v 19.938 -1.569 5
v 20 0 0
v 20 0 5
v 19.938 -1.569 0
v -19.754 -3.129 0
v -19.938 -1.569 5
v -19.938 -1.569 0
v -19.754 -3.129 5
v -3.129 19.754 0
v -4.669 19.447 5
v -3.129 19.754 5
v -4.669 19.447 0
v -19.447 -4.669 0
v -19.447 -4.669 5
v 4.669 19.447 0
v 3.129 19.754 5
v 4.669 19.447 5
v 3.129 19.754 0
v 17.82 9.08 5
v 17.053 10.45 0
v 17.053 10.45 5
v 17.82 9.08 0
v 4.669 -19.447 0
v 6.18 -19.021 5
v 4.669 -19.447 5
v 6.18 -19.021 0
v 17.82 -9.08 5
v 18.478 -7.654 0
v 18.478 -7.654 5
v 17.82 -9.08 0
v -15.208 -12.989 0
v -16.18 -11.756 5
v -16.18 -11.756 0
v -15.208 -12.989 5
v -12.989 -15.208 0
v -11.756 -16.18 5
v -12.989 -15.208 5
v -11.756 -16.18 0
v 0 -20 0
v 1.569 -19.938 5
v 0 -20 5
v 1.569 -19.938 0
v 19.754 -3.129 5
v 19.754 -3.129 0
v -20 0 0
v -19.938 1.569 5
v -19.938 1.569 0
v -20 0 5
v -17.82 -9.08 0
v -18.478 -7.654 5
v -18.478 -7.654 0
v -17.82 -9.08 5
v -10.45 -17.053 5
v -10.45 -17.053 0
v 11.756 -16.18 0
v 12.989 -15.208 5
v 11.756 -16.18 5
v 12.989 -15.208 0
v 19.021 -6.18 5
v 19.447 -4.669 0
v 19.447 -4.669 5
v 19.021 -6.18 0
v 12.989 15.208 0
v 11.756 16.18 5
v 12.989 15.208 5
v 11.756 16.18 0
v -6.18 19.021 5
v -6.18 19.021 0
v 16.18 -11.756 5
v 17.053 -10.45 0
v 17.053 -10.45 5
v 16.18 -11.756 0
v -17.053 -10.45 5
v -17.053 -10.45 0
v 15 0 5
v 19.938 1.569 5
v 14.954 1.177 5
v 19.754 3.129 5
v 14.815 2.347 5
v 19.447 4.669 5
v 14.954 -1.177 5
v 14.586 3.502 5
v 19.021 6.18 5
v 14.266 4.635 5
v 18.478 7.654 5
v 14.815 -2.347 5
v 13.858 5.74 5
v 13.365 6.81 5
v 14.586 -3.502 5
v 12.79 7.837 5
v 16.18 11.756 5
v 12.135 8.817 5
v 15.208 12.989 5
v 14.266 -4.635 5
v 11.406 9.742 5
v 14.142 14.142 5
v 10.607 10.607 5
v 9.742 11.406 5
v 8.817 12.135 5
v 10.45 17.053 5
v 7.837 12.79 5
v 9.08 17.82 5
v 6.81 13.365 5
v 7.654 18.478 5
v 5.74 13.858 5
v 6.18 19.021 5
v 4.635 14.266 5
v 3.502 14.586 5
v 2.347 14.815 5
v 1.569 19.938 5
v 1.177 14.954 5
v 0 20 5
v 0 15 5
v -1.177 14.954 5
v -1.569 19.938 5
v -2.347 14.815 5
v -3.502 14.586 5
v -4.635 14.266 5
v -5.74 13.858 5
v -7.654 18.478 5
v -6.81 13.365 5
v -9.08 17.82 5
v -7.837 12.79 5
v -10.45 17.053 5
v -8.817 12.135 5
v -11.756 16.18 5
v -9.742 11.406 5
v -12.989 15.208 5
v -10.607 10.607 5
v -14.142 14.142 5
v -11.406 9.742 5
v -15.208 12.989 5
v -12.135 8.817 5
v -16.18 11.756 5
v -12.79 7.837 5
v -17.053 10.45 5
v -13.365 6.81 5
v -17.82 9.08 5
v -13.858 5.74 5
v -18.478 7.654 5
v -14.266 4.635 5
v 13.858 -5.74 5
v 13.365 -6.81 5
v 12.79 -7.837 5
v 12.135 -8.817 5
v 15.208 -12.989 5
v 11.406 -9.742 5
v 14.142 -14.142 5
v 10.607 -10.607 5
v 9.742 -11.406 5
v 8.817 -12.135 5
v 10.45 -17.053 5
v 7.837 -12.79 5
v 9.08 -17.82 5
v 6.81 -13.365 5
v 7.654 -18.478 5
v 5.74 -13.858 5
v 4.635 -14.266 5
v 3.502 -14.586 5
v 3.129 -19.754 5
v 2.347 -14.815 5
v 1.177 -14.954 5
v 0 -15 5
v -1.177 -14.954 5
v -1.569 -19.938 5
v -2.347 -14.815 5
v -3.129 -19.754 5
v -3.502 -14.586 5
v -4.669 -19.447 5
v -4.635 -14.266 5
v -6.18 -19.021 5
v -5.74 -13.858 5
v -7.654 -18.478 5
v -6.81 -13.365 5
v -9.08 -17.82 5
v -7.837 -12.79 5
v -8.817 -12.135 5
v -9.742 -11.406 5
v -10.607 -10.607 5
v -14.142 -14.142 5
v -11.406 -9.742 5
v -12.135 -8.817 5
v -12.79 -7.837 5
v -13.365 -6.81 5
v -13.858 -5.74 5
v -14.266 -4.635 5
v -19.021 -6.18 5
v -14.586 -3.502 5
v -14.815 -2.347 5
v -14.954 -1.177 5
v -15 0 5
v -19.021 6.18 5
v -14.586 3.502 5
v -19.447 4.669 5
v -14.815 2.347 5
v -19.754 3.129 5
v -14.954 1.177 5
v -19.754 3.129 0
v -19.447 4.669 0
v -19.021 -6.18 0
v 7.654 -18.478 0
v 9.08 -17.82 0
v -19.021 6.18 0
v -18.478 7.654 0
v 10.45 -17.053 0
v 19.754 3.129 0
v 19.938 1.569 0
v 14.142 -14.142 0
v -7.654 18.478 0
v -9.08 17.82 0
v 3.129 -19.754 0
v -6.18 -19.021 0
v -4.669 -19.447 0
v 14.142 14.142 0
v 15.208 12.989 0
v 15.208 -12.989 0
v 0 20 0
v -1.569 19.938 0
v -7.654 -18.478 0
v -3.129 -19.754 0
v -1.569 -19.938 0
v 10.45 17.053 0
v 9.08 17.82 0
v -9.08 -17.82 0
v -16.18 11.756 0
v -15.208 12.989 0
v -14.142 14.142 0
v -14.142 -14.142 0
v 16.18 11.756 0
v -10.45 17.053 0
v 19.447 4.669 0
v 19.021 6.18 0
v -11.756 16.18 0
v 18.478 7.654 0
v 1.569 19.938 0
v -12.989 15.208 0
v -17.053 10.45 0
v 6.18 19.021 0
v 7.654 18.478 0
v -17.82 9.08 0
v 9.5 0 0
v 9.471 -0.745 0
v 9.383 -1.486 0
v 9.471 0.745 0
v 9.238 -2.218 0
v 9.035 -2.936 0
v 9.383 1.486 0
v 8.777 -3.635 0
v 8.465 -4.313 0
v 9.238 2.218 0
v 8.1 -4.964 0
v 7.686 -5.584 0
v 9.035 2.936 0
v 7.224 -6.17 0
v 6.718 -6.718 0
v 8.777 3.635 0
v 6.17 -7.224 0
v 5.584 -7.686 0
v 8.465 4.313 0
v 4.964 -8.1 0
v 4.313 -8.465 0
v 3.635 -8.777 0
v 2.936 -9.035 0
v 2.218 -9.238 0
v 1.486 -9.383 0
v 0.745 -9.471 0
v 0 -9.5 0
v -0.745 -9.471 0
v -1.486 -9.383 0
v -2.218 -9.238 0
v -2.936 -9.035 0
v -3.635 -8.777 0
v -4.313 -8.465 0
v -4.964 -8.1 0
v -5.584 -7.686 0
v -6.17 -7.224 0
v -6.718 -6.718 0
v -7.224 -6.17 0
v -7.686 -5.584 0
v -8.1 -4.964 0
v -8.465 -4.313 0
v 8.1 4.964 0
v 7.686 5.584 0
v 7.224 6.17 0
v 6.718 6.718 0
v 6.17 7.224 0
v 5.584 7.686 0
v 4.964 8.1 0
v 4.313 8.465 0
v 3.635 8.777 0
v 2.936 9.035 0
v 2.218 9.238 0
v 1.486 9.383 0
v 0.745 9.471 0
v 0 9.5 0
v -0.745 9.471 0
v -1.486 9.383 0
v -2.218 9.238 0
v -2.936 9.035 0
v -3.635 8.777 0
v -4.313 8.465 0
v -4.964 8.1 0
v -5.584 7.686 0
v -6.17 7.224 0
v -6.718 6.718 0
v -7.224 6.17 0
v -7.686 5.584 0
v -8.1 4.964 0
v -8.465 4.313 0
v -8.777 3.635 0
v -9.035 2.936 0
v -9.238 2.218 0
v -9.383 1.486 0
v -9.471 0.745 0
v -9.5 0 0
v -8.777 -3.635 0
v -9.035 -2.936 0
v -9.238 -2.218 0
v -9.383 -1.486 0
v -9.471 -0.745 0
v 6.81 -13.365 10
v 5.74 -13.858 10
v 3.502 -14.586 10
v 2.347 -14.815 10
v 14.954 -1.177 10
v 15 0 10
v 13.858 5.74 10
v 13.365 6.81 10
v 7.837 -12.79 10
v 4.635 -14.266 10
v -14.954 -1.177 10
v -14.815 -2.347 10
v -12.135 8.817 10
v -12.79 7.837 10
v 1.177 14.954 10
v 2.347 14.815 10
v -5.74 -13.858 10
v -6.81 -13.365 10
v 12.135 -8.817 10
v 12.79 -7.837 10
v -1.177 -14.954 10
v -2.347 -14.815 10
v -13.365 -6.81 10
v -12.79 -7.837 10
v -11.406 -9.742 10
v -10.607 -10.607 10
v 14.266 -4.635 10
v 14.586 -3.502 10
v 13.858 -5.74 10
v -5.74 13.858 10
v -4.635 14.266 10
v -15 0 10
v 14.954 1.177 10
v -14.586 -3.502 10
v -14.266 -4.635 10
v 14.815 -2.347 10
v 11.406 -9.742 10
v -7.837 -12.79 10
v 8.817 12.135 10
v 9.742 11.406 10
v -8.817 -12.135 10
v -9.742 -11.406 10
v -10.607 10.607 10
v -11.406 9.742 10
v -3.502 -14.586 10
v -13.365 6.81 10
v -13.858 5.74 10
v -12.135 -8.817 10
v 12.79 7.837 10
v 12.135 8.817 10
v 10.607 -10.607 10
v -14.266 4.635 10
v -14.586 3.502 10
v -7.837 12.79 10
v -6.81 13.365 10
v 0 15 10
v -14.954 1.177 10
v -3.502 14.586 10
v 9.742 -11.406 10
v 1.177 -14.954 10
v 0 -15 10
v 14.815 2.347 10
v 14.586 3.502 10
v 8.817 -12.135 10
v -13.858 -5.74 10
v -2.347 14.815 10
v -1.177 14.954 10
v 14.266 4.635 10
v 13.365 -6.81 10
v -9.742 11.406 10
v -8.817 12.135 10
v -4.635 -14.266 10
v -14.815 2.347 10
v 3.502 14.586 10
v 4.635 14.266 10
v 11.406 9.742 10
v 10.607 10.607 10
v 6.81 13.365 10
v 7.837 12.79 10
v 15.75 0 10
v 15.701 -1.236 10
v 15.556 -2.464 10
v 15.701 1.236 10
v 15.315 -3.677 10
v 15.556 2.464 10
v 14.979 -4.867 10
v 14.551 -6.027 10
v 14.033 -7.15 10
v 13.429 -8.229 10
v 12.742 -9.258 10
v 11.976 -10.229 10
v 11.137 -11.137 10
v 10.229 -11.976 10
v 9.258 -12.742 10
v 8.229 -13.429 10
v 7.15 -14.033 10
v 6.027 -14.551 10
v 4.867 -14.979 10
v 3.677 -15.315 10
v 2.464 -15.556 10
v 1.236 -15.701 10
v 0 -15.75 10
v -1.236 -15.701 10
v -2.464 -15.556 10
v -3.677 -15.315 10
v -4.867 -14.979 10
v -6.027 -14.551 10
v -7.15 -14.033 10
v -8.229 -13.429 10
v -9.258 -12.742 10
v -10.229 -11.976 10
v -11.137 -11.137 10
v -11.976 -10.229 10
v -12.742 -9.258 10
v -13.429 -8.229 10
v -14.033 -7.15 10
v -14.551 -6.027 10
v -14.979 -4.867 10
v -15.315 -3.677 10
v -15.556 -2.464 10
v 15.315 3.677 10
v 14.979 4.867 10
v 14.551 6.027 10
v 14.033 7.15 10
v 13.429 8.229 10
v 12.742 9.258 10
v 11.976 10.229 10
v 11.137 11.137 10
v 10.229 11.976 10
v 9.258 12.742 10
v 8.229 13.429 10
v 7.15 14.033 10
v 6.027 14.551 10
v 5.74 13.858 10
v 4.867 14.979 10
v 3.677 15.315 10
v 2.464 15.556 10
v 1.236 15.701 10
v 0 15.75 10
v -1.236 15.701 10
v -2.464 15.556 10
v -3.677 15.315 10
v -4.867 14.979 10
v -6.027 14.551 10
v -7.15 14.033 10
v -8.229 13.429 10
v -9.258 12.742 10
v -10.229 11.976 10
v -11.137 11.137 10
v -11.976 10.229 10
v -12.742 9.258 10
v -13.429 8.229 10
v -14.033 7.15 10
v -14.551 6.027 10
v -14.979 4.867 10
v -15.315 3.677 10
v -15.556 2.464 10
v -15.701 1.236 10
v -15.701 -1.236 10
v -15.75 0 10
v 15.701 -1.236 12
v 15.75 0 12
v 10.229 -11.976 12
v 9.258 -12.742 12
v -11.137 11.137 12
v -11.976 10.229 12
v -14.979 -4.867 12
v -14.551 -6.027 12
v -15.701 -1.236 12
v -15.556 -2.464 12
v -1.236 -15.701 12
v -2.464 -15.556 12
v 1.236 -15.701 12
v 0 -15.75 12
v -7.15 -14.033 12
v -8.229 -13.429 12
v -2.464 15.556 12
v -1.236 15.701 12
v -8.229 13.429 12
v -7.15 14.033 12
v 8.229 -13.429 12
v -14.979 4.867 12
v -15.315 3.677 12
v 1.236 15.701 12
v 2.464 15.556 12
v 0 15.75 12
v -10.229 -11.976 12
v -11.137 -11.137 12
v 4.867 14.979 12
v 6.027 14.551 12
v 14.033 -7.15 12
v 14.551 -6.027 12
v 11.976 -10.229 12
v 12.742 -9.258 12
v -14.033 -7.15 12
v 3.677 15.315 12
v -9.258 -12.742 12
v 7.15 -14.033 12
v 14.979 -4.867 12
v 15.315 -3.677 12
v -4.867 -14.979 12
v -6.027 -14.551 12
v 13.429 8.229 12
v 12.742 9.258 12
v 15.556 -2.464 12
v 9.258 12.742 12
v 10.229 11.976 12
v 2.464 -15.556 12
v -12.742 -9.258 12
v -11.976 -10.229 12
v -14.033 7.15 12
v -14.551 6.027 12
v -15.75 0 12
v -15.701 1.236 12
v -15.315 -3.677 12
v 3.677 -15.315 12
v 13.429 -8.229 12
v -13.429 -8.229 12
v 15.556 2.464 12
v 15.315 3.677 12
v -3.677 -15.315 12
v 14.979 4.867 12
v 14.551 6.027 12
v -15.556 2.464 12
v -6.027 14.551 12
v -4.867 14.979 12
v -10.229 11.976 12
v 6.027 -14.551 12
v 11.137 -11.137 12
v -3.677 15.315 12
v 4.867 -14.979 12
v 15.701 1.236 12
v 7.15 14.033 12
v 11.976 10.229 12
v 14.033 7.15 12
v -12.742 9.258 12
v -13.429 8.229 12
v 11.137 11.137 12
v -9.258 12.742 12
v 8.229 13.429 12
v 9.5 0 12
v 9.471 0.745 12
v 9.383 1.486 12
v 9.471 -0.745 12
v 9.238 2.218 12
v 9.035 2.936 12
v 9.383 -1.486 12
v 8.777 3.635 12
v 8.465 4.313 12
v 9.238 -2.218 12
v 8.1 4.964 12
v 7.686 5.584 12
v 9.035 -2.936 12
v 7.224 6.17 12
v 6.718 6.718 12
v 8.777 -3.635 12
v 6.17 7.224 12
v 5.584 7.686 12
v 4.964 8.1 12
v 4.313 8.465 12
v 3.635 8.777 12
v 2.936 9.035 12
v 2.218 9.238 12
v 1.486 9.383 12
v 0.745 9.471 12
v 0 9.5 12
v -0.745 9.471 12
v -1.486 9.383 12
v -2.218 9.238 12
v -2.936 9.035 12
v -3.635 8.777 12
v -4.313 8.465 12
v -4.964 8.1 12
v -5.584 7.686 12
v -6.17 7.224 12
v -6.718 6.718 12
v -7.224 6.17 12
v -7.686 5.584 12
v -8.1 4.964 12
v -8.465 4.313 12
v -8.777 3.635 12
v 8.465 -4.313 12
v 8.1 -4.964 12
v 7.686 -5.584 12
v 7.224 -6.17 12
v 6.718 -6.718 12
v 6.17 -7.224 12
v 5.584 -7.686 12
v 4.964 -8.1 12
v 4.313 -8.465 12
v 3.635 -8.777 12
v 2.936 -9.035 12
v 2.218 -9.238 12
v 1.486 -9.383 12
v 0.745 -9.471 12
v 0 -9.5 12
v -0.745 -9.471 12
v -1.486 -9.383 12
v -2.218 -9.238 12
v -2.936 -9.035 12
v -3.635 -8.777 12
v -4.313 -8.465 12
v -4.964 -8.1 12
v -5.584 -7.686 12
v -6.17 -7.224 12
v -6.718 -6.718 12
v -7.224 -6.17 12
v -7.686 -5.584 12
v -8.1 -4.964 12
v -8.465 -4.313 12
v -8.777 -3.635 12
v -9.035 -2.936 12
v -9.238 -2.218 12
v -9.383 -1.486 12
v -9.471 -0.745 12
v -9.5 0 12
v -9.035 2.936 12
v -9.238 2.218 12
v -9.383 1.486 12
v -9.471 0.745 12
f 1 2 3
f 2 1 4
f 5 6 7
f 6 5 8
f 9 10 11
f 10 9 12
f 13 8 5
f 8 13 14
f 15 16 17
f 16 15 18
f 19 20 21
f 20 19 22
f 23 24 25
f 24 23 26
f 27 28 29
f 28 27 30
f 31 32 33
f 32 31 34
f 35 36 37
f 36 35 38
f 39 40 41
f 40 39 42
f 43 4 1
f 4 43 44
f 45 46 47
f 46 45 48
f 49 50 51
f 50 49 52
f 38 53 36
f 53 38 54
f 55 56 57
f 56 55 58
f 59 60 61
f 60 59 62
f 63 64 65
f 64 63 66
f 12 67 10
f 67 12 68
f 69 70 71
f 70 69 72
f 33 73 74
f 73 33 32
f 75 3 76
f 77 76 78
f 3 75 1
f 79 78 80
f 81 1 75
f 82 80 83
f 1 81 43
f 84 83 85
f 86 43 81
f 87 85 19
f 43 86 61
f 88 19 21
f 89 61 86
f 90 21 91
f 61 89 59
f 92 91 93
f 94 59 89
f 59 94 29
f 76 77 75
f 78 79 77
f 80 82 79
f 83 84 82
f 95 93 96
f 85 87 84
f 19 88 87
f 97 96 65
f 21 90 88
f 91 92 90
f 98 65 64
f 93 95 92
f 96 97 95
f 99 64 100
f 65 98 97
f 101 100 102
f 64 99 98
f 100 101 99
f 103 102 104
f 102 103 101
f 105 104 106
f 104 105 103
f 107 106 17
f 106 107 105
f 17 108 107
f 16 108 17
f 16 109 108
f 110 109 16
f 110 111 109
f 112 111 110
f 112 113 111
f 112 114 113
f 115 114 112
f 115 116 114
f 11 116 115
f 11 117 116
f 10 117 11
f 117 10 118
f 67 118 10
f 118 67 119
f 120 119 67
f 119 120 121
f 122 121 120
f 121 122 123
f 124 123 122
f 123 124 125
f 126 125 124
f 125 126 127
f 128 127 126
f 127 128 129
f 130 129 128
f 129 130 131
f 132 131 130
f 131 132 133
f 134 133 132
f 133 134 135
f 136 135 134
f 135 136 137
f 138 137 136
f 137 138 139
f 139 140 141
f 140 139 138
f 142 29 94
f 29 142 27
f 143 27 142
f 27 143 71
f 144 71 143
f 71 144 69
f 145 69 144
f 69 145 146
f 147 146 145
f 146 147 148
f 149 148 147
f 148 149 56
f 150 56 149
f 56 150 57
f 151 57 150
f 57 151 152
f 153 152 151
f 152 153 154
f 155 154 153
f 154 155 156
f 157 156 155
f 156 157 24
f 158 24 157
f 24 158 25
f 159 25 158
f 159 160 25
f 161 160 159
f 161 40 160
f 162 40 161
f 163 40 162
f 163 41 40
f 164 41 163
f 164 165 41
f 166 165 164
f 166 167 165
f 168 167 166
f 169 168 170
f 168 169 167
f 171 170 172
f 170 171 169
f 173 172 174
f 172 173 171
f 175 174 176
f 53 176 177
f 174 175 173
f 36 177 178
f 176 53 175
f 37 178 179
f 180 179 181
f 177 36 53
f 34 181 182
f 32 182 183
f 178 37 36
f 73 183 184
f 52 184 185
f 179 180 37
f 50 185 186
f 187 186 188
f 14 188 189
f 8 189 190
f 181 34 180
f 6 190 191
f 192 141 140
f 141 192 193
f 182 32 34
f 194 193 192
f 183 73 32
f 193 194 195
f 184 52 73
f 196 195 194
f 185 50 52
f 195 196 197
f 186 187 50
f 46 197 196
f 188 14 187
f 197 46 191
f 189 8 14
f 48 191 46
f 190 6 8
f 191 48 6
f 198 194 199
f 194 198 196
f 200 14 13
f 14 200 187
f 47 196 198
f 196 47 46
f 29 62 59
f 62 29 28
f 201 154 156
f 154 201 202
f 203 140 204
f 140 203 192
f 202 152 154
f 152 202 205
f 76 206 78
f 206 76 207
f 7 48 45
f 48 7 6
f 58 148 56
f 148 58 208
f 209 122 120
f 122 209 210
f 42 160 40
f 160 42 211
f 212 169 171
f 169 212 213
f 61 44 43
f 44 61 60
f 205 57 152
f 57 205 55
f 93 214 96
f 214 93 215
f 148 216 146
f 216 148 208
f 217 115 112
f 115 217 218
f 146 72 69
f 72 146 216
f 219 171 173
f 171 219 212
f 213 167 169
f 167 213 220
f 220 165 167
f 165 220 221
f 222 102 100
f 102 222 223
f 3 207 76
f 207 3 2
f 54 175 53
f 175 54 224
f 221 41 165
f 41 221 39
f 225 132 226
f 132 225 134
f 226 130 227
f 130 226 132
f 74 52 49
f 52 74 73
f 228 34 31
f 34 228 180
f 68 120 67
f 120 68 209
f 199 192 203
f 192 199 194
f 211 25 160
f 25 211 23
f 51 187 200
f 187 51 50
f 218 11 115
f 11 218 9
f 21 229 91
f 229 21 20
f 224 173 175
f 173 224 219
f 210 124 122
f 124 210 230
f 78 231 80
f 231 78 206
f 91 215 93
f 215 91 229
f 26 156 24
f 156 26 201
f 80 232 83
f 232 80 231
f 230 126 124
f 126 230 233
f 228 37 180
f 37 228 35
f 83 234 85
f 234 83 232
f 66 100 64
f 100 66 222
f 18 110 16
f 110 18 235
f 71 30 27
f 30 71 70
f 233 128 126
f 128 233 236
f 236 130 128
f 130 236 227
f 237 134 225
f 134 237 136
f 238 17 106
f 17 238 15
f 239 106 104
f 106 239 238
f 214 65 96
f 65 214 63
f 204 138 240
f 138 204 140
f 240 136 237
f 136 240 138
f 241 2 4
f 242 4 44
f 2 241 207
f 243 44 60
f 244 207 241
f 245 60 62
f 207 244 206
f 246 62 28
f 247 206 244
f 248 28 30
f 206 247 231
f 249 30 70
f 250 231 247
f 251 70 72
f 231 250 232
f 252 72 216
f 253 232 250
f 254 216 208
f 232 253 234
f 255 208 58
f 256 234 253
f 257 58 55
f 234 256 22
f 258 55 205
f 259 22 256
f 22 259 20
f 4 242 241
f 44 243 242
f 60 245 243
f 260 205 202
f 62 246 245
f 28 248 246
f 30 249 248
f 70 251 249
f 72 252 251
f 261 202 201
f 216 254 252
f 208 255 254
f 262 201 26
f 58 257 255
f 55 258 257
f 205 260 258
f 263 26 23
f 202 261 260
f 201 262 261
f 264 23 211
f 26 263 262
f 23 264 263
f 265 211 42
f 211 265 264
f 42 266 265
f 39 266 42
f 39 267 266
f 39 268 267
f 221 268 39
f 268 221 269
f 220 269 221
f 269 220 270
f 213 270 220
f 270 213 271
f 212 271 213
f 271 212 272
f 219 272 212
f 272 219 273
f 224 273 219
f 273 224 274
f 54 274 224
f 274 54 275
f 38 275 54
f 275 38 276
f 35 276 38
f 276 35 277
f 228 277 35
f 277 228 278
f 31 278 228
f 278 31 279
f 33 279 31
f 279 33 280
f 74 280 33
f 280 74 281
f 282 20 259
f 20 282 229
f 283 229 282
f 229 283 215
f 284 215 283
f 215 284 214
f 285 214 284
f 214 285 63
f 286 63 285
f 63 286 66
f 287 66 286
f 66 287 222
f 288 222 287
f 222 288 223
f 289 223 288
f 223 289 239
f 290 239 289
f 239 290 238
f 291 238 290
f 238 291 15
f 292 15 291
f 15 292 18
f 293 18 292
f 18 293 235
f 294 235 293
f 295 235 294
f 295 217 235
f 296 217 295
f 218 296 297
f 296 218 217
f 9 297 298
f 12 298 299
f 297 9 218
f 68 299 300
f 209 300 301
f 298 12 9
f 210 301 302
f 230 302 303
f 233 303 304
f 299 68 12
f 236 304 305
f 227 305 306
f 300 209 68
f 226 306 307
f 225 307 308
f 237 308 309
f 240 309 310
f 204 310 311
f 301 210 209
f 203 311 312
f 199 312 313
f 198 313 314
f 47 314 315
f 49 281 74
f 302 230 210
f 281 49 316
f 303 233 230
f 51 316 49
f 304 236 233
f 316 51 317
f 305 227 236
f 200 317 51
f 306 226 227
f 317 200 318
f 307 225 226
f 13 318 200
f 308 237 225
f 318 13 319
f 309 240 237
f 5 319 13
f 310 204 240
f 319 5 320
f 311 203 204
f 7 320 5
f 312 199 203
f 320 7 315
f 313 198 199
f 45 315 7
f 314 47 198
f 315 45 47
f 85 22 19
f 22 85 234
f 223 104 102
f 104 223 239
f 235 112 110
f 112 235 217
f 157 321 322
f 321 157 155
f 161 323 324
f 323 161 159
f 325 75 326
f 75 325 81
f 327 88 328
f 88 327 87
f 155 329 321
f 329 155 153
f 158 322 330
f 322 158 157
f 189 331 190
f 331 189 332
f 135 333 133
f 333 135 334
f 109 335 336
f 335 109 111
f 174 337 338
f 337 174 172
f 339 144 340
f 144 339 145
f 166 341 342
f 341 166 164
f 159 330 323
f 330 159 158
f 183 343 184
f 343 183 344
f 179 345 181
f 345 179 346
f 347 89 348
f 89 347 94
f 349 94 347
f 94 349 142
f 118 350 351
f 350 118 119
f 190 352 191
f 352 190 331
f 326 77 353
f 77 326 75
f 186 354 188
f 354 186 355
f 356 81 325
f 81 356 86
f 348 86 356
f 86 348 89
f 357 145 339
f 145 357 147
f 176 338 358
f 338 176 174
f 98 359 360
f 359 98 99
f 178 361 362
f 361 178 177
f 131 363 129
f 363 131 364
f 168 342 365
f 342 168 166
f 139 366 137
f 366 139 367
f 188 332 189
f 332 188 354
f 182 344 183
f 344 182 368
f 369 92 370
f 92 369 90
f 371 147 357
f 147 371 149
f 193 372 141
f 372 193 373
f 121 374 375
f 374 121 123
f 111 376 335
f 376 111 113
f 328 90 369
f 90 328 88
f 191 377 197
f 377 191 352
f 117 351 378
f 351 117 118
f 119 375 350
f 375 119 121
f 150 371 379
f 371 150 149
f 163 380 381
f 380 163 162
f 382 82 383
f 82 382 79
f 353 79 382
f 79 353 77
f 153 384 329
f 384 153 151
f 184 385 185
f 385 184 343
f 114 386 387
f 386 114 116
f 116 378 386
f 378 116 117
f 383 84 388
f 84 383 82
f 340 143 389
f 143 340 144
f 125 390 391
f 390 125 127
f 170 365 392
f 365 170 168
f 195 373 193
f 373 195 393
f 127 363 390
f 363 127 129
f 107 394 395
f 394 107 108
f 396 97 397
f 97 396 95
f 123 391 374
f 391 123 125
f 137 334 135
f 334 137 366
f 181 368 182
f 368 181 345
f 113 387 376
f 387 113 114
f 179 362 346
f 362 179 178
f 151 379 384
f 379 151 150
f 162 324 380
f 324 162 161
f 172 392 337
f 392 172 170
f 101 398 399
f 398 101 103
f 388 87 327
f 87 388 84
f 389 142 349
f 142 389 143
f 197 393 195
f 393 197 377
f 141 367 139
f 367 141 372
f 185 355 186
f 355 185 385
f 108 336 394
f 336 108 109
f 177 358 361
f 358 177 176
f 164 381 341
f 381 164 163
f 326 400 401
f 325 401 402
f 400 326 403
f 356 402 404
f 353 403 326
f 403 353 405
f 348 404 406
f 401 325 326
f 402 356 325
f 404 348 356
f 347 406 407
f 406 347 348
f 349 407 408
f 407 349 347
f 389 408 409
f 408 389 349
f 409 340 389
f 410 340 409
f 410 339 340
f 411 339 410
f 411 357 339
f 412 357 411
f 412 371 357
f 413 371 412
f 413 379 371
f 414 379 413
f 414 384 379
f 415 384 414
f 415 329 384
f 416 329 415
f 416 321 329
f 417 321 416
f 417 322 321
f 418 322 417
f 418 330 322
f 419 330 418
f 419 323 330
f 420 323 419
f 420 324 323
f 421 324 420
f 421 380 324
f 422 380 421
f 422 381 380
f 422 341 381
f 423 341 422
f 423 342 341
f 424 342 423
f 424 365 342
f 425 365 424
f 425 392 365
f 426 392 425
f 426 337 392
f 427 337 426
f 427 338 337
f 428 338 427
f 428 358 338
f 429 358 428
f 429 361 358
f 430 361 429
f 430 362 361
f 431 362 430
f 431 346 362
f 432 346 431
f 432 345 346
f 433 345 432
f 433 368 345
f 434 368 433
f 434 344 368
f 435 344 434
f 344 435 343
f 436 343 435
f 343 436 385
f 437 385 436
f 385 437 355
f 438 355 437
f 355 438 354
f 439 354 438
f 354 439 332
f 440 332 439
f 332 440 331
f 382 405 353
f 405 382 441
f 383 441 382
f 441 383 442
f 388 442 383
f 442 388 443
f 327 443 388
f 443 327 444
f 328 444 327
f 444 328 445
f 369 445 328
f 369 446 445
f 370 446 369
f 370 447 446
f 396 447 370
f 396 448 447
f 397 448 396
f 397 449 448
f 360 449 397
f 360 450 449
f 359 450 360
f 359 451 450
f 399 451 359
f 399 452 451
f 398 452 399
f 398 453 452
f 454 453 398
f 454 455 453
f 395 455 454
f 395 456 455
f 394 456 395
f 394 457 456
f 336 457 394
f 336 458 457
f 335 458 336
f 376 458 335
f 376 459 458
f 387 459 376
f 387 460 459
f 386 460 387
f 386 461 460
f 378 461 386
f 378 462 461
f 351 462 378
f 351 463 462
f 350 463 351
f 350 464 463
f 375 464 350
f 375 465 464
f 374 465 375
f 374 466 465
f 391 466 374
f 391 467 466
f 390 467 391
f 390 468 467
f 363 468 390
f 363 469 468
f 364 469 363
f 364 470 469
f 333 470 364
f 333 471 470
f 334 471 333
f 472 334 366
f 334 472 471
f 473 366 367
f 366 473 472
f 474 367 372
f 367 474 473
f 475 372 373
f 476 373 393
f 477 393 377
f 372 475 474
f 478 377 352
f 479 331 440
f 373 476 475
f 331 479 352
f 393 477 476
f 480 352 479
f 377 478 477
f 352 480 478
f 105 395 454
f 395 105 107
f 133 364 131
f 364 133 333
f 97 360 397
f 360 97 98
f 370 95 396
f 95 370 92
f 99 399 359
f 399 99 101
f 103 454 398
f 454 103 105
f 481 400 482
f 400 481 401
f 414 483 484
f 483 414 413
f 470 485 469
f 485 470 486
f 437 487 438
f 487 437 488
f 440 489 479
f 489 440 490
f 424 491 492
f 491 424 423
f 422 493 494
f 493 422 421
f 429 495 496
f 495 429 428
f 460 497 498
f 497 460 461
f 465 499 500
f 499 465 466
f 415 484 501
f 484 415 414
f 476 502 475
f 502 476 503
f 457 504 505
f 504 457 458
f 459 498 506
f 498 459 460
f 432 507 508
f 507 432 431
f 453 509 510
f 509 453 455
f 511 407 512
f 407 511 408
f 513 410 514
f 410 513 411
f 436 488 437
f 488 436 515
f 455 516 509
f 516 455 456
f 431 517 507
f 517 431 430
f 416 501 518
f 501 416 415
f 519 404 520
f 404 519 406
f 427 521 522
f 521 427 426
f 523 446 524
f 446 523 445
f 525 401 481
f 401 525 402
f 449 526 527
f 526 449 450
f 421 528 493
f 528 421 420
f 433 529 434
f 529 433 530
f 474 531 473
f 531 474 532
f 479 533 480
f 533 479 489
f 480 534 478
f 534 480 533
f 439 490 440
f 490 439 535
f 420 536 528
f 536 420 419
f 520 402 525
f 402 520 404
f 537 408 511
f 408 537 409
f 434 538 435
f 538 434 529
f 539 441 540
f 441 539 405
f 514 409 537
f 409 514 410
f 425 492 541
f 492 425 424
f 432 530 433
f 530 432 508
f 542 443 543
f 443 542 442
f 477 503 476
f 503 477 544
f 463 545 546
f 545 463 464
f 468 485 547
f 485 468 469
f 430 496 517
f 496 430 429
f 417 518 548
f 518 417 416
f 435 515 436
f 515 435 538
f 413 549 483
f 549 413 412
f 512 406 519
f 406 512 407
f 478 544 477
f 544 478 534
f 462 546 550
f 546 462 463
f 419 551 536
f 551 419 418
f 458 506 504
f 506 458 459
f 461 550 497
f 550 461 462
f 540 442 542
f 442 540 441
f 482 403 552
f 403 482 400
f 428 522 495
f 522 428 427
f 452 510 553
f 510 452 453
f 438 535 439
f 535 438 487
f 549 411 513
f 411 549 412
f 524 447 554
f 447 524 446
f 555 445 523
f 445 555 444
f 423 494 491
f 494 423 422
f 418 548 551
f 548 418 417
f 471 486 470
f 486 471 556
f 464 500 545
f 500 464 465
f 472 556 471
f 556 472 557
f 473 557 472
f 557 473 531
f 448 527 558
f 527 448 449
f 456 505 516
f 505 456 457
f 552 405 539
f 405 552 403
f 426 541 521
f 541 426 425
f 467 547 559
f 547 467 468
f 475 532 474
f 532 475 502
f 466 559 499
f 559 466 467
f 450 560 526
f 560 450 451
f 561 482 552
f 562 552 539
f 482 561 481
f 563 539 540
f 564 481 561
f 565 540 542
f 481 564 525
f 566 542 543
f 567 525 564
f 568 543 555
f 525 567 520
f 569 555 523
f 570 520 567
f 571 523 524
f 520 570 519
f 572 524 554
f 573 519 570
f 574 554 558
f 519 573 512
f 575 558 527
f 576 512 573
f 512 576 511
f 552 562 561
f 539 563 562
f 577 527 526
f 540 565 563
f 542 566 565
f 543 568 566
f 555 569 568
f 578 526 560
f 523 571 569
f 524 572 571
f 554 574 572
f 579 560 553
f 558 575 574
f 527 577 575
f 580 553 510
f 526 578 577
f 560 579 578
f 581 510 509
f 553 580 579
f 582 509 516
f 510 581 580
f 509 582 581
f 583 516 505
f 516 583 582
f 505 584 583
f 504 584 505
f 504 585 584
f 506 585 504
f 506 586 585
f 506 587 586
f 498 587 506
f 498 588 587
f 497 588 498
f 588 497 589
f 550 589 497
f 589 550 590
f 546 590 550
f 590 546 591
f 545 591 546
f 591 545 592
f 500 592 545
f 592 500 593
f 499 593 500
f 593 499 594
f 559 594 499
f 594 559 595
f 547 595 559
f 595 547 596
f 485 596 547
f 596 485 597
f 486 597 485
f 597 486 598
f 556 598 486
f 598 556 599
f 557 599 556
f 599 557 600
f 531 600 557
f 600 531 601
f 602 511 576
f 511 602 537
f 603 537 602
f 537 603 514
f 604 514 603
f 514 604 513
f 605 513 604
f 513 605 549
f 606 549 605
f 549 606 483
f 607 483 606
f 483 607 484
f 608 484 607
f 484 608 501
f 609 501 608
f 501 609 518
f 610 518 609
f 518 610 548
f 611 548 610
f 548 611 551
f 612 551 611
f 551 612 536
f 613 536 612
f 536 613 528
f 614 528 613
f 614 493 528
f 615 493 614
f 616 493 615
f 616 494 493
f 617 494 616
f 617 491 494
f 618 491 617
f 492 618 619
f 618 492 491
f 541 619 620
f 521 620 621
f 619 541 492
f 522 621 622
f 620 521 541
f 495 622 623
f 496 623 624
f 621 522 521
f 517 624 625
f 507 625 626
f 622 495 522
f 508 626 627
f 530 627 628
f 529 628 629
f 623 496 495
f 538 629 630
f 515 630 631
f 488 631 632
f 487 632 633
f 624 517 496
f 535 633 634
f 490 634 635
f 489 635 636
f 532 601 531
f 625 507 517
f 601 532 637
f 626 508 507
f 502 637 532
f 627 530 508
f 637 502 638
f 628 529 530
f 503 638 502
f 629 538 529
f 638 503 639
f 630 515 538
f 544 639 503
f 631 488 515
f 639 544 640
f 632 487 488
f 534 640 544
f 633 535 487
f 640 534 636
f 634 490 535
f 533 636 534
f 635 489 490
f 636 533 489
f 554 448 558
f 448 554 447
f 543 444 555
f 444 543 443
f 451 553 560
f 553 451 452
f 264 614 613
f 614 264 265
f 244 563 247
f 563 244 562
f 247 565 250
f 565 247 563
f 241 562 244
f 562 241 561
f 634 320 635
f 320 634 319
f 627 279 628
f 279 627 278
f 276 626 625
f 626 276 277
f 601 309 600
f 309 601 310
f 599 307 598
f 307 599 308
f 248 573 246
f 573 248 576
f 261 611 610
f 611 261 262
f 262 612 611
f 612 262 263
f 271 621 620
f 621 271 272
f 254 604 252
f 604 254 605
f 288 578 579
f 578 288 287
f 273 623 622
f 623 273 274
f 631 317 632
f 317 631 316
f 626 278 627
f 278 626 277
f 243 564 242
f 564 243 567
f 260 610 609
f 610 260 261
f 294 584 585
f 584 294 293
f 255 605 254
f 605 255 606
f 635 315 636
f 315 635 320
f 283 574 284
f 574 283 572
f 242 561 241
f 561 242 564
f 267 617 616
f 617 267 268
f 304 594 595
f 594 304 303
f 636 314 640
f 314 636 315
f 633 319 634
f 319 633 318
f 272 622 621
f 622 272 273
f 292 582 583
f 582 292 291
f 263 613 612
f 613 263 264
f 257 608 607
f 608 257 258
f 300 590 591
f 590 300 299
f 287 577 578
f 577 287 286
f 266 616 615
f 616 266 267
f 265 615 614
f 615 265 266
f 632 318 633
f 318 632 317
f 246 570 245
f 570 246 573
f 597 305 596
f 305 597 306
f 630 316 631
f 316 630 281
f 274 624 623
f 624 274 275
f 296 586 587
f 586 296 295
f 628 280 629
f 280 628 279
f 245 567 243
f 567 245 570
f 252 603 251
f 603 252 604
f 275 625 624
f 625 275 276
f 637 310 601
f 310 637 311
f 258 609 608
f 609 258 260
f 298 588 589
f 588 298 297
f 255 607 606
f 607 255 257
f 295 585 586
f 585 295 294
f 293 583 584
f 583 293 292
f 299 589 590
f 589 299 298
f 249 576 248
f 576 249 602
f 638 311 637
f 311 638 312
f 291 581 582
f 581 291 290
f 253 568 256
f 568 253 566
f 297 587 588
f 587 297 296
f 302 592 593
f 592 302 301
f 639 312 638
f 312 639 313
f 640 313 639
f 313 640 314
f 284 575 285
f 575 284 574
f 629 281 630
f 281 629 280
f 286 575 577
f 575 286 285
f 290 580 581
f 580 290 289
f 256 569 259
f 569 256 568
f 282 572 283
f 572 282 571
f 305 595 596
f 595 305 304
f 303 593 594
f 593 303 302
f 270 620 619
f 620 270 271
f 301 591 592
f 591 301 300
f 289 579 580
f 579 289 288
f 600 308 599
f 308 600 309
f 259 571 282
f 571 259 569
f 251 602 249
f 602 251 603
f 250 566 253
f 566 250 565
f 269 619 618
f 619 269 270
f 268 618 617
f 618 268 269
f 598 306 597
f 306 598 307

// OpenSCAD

External_Busing_Diameter = 40; //External Bushing Diam
Internal_Spool_Diameter = 30; //Internal Diam of Spool to support
Tube_Or_Support_Diameter = 19; //Spool support Diam
Lip_Diameter = 1.5;
e_diam = External_Busing_Diameter;
i_diam = Internal_Spool_Diameter;
t_diam = Tube_Or_Support_Diameter;
l_diam = Lip_Diameter;
 difference(){
union(){translate([0,0,0])
    linear_extrude (5,$fn=80)
        circle(d=e_diam);
  
    linear_extrude (10,$fn=80)   
        circle (d=i_diam);
    translate([0,0,10])
    linear_extrude (2,$fn=80)
        circle (d=i_diam+l_diam);
}
    translate([0,0,0])
        linear_extrude (12,$fn=80)
        circle (d=t_diam);
    }
